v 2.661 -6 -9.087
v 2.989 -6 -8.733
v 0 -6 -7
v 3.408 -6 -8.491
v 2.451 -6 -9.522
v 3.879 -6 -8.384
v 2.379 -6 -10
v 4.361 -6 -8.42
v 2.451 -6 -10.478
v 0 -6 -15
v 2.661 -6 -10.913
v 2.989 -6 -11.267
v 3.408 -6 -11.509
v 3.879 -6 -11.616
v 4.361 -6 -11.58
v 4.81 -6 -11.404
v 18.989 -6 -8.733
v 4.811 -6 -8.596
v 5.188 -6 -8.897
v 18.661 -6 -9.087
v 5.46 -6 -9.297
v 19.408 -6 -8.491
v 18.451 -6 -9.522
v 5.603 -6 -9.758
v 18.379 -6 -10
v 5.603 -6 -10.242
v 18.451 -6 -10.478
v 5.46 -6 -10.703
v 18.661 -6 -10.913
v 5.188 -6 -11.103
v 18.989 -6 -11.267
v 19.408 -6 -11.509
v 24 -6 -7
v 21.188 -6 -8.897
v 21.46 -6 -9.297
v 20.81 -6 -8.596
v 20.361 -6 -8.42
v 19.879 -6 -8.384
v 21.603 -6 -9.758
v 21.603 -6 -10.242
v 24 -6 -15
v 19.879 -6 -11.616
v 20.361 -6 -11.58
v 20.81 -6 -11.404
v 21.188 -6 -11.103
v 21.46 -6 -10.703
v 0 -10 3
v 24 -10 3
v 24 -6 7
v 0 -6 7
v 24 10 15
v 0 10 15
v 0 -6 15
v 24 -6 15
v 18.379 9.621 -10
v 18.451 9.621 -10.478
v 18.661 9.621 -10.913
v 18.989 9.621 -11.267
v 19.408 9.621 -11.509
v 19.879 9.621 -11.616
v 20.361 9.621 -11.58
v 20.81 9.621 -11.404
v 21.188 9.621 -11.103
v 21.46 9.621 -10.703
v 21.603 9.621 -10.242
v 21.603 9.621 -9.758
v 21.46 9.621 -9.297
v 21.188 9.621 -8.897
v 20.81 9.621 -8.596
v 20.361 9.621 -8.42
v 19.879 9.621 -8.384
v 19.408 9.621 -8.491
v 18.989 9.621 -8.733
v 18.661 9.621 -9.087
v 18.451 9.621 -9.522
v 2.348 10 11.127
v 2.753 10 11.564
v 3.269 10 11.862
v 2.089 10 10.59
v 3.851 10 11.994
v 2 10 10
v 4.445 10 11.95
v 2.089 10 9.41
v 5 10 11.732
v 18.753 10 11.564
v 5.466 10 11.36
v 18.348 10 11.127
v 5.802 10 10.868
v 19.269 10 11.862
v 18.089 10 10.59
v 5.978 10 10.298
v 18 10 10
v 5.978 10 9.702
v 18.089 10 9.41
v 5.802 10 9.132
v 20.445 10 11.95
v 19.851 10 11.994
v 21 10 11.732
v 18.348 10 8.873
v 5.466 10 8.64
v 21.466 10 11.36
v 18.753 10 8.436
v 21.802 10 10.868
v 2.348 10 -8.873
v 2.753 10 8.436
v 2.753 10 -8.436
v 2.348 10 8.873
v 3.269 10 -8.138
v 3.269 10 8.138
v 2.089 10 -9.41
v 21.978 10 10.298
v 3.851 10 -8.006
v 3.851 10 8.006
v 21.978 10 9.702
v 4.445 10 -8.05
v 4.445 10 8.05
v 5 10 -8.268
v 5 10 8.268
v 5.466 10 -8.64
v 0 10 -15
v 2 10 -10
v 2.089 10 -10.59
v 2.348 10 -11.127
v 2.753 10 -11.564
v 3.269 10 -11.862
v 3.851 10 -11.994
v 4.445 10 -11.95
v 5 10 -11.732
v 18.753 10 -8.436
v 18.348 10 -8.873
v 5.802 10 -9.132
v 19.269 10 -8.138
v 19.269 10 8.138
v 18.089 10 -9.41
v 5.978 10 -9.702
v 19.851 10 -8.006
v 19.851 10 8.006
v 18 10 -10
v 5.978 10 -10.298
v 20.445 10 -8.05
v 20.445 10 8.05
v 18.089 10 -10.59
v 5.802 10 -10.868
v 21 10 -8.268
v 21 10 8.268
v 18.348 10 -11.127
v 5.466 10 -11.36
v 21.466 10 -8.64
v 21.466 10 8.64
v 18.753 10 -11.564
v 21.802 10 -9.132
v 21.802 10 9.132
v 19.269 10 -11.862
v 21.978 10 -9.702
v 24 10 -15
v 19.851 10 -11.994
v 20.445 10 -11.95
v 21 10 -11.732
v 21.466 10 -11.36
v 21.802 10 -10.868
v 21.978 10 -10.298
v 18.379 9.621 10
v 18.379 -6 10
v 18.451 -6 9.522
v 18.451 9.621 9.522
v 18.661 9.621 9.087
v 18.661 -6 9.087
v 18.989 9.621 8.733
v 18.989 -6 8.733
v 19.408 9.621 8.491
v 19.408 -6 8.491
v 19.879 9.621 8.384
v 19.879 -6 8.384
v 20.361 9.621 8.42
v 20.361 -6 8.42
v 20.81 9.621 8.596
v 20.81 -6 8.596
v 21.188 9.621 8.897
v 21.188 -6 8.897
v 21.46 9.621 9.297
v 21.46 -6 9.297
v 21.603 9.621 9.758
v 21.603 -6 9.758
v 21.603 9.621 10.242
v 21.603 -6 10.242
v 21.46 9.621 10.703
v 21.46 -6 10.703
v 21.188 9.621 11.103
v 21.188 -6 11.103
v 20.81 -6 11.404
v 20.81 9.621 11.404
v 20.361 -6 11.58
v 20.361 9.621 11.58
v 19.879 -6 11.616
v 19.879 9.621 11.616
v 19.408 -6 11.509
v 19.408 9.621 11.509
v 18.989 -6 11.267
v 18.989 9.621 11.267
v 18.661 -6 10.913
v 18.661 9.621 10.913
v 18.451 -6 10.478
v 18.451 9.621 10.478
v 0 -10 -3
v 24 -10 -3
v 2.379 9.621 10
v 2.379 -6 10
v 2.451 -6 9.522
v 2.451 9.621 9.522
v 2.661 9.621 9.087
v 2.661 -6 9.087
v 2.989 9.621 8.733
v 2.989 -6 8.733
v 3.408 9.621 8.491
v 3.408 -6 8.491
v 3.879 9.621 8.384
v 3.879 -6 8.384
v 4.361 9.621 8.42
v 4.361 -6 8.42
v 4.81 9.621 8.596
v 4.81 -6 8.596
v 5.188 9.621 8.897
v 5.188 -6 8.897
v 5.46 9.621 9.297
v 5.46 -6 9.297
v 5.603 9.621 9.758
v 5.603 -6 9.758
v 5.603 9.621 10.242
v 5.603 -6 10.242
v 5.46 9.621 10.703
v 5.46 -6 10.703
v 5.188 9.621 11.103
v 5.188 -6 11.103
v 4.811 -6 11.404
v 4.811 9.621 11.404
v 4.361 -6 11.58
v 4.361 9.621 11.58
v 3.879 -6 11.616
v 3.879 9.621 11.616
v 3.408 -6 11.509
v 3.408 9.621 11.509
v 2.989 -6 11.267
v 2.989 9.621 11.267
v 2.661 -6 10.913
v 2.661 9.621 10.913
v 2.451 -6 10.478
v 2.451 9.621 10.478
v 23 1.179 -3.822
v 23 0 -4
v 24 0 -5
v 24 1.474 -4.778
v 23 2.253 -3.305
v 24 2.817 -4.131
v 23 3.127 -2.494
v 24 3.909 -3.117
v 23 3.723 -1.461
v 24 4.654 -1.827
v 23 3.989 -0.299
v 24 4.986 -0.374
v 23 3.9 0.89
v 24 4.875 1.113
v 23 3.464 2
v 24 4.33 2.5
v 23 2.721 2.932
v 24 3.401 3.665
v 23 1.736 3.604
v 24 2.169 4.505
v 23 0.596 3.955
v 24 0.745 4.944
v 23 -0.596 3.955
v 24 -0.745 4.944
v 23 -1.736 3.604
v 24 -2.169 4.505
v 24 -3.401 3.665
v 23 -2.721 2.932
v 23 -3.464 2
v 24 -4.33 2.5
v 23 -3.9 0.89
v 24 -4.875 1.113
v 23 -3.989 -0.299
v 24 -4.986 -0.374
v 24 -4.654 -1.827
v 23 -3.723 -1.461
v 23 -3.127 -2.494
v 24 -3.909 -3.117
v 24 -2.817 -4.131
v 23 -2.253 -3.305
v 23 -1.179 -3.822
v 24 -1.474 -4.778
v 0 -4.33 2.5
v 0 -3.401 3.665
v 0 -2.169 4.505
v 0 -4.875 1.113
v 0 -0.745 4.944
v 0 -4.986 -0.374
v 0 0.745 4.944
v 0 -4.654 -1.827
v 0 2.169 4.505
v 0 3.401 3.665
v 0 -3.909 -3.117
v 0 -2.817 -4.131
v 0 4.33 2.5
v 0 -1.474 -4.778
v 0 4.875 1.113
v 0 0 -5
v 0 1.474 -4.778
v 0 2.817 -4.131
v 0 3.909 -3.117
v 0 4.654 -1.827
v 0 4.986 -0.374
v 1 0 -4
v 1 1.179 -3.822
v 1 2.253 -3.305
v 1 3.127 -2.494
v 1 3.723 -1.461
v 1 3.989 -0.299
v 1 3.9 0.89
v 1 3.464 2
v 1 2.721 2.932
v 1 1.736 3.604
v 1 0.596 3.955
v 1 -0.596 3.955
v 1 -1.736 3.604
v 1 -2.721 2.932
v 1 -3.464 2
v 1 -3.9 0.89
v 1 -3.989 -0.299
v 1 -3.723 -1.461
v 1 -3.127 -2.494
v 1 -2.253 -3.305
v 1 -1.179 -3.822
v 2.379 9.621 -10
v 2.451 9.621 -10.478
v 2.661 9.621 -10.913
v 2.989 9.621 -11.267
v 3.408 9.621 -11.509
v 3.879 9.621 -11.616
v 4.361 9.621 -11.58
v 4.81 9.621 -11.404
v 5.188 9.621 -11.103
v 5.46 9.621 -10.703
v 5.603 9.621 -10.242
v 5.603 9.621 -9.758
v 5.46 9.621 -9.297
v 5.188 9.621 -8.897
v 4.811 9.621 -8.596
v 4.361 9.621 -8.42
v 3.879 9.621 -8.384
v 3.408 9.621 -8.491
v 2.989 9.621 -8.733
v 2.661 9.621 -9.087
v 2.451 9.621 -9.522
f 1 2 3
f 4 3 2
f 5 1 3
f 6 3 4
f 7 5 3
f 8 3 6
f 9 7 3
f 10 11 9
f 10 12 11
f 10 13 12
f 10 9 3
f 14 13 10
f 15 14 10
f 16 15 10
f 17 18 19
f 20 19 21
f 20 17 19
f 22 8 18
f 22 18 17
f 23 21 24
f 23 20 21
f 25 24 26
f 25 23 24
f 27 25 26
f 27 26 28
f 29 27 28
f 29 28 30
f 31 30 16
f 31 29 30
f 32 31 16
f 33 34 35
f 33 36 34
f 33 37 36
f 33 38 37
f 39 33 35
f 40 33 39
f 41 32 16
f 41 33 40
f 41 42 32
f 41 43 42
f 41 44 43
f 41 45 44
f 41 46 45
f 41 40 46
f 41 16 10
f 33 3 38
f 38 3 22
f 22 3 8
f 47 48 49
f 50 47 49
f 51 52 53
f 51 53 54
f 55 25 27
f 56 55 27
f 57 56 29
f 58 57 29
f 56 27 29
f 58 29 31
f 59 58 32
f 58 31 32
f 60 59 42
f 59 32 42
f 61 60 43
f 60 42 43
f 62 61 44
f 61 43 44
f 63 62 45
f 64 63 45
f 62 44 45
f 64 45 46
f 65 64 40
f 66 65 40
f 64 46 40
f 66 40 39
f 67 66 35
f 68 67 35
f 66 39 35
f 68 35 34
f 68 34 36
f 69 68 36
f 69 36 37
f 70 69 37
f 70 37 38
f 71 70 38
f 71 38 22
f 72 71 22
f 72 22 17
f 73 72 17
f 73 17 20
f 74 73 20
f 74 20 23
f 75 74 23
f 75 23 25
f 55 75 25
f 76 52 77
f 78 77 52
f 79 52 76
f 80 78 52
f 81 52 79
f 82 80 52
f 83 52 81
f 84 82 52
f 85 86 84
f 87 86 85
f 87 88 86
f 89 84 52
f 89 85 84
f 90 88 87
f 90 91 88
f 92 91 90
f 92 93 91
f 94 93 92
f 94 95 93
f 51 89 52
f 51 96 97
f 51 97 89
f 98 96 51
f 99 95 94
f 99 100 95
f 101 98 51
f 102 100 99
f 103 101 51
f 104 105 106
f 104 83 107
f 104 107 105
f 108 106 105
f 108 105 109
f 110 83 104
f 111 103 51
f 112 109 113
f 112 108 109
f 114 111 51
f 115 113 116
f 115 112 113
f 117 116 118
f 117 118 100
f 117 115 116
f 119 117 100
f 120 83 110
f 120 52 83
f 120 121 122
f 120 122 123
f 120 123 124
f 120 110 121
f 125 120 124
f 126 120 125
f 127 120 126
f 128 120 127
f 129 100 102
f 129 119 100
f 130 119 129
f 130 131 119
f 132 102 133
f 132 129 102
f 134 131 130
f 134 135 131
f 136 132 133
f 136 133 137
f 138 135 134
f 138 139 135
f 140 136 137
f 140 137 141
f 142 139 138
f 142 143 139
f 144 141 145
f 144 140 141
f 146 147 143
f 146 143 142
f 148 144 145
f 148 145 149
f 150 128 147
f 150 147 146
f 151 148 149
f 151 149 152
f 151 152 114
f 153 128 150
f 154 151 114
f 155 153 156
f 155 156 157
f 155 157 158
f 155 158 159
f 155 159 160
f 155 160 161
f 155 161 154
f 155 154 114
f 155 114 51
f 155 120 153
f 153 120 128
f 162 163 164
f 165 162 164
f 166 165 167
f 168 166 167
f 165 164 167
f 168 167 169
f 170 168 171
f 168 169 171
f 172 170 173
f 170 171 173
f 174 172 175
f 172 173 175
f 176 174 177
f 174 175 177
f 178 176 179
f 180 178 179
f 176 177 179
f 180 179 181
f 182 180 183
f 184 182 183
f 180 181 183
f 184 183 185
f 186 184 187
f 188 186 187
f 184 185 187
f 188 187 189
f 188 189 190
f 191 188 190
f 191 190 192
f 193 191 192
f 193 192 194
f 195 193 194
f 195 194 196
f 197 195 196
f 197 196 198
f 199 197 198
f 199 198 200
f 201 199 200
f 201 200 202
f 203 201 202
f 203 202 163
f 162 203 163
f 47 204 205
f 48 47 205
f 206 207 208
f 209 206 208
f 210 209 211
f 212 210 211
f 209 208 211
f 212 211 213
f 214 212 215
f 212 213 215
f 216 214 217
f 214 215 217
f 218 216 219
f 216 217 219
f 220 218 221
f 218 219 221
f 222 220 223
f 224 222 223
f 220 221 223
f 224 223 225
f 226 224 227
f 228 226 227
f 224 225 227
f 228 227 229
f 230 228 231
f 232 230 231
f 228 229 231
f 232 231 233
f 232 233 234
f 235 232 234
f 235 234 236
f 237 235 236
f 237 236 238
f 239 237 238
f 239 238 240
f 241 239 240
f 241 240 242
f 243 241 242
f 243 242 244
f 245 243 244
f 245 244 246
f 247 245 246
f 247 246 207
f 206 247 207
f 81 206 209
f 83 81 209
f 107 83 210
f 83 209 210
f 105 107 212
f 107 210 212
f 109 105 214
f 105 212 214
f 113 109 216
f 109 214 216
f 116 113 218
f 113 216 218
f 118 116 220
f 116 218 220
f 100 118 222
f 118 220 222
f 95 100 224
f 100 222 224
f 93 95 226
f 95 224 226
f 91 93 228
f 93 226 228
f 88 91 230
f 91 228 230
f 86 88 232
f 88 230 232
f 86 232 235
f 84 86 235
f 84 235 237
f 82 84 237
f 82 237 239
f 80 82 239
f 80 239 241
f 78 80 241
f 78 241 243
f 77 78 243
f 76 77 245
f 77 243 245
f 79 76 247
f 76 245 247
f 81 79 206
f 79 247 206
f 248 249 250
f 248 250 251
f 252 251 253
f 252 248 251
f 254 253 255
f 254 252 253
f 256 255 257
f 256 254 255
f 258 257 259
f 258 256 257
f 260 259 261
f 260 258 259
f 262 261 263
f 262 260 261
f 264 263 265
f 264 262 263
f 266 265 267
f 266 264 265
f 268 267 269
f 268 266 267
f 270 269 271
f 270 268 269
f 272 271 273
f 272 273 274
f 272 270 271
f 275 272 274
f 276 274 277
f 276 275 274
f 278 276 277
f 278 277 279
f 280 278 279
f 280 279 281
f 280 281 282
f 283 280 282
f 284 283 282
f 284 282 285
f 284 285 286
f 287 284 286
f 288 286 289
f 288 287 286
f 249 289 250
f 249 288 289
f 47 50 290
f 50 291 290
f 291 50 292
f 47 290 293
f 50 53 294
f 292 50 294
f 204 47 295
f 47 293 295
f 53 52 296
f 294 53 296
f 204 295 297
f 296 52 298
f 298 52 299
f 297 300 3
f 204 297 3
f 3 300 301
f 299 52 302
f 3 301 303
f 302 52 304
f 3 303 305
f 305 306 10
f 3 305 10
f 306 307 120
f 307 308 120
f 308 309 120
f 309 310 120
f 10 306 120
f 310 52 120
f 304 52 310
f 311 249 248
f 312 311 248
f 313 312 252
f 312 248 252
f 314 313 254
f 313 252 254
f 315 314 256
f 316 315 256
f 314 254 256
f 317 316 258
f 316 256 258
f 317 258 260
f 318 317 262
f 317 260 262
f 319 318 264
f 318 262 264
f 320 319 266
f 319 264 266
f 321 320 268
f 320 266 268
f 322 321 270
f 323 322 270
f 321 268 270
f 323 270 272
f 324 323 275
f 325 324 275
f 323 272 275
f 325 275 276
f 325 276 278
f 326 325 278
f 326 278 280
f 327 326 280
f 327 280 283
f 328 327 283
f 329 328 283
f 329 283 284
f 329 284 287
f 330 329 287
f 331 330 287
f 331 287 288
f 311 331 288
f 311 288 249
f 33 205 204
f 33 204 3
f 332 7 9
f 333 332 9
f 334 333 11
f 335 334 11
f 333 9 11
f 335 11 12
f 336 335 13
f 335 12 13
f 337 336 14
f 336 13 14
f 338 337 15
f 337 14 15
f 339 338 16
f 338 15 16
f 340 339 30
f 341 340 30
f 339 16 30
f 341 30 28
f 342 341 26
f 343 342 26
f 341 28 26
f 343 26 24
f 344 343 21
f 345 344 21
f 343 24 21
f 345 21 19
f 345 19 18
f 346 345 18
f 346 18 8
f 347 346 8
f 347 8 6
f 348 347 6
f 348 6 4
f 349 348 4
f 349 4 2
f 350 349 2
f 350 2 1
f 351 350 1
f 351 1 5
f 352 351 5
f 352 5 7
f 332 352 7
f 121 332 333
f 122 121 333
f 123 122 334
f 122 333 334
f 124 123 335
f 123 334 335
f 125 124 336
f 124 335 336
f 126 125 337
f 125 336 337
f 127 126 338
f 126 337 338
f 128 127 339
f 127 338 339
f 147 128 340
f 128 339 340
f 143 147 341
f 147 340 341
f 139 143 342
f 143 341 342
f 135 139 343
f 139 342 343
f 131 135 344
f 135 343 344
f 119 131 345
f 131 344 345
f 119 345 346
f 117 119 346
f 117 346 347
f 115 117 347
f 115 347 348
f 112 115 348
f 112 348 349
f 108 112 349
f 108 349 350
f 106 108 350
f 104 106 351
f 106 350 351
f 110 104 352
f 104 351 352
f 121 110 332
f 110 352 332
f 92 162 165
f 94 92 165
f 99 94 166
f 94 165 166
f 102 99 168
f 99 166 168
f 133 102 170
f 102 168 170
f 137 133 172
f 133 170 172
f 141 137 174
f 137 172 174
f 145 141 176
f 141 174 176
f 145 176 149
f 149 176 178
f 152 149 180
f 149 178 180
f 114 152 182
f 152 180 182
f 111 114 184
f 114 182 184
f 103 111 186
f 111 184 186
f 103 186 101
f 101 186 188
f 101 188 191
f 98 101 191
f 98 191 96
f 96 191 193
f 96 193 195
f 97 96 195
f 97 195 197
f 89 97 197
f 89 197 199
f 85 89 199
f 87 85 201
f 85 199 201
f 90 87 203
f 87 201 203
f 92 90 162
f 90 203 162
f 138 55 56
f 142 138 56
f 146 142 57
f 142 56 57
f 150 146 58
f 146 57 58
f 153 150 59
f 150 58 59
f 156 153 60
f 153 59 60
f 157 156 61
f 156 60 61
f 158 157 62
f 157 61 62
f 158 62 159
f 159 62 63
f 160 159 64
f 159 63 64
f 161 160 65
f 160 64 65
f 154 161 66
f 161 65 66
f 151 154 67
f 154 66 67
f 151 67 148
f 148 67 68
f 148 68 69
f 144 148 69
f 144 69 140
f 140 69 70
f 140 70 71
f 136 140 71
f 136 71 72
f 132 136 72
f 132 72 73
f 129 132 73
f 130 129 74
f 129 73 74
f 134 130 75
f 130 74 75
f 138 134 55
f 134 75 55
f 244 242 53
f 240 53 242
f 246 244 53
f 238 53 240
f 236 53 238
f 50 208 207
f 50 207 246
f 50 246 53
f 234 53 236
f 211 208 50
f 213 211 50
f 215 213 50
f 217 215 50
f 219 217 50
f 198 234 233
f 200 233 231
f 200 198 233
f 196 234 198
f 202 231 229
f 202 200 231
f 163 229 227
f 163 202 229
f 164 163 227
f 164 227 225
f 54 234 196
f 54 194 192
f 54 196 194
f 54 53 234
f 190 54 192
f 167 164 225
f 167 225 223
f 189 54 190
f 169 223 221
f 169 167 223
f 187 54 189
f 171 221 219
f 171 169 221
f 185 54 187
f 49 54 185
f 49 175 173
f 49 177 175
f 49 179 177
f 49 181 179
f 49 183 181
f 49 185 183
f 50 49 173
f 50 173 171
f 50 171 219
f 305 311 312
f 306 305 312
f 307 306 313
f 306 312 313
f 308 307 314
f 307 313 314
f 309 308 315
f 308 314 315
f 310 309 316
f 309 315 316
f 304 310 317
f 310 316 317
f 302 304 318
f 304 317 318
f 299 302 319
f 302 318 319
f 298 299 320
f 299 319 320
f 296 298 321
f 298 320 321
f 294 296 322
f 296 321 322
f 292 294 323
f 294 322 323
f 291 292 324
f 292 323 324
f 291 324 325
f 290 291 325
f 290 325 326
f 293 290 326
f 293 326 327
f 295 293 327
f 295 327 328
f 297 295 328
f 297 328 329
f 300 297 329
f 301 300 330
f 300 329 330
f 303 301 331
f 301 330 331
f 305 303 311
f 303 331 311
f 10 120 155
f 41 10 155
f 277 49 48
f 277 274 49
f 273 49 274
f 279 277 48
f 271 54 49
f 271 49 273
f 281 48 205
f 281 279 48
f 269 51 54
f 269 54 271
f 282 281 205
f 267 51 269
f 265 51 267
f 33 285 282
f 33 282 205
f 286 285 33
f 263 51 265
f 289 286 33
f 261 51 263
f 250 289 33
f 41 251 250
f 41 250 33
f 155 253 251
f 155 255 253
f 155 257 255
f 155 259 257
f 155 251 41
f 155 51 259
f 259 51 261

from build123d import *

# Parameters (mm, degrees)
ESQUISSE1_W                   = 24
ESQUISSE1_H                   = 30
BOSS_EXTRU_1_DEPTH            = 20
ESQUISSE2_W                   = 12
ESQUISSE2_H                   = 4
ENL_V_MAT_EXTRU_1_DEPTH       = 31.01666204
ESQUISSE3_W                   = 12
ESQUISSE3_H                   = 4
ENL_V_MAT_EXTRU_2_DEPTH       = 31.01666204
D_POUILLE1_ANGLE              = 45
DIAM_TRE_DU_PER_AGE_8_0_8_1_D = 8
D_GAGEMENT_M31_D              = 3.242
D_GAGEMENT_M31_DEPTH          = 20
CHANFREIN1_SIZE               = 0.379
CHANFREIN2_SIZE               = 1


with BuildPart() as part:
    # Esquisse1 → Boss.-Extru.1 (new body)
    with BuildSketch(Plane(origin=(0, 10, 0), x_dir=(1, 0, 0), z_dir=(0, 1, 0))):
        with Locations((12, 0)):
            Rectangle(ESQUISSE1_W, ESQUISSE1_H)
    extrude(amount=-BOSS_EXTRU_1_DEPTH)

    # Esquisse2 → Enlèv. mat.-Extru.1 (cut, through all)
    with BuildSketch(Plane(origin=(24, 0, 0), x_dir=(0, 0, -1), z_dir=(1, 0, 0))):
        with Locations((9, -8)):
            Rectangle(ESQUISSE2_W, ESQUISSE2_H)
    extrude(amount=-ENL_V_MAT_EXTRU_1_DEPTH, mode=Mode.SUBTRACT)

    # Esquisse3 → Enlèv. mat.-Extru.2 (cut, through all)
    with BuildSketch(Plane(origin=(24, 0, 0), x_dir=(0, 0, -1), z_dir=(1, 0, 0))):
        with Locations((-9, -8)):
            Rectangle(ESQUISSE3_W, ESQUISSE3_H)
    extrude(amount=-ENL_V_MAT_EXTRU_2_DEPTH, mode=Mode.SUBTRACT)

    # Dépouille1
    d_pouille1_faces = [part.faces().sort_by_distance(p)[0] for p in [
        (12, -8, -3),
        (12, -8, 3),
    ]]
    draft(d_pouille1_faces, Plane(origin=(0, -10, 0), x_dir=(0, 0, -1), z_dir=(0, -1, 0)), D_POUILLE1_ANGLE)

    # Diamètre du perçage Ø8.0 (8)1 (through all)
    with Locations(Plane.ZY):
        with Locations((0, 0)):
            Hole(DIAM_TRE_DU_PER_AGE_8_0_8_1_D / 2)

    # Dégagement M31
    with Locations(Plane(origin=(0, 10, 0), x_dir=(1, 0, 0), z_dir=(0, 1, 0))):
        with Locations((20, -10), (4, -10), (4, 10), (20, 10)):
            Hole(D_GAGEMENT_M31_D / 2, depth=D_GAGEMENT_M31_DEPTH)

    # Chanfrein1
    chanfrein1_edges = [part.edges().sort_by_distance(p)[0] for p in [
        (21.621, 10, -10),
        (5.621, 10, -10),
        (5.621, 10, 10),
        (21.621, 10, 10),
    ]]
    chamfer(chanfrein1_edges, length=CHANFREIN1_SIZE)

    # Chanfrein2
    chanfrein2_edges = [part.edges().sort_by_distance(p)[0] for p in [
        (0, 0, 4),
        (24, 0, 4),
    ]]
    chamfer(chanfrein2_edges, length=CHANFREIN2_SIZE)


solid = part.part
